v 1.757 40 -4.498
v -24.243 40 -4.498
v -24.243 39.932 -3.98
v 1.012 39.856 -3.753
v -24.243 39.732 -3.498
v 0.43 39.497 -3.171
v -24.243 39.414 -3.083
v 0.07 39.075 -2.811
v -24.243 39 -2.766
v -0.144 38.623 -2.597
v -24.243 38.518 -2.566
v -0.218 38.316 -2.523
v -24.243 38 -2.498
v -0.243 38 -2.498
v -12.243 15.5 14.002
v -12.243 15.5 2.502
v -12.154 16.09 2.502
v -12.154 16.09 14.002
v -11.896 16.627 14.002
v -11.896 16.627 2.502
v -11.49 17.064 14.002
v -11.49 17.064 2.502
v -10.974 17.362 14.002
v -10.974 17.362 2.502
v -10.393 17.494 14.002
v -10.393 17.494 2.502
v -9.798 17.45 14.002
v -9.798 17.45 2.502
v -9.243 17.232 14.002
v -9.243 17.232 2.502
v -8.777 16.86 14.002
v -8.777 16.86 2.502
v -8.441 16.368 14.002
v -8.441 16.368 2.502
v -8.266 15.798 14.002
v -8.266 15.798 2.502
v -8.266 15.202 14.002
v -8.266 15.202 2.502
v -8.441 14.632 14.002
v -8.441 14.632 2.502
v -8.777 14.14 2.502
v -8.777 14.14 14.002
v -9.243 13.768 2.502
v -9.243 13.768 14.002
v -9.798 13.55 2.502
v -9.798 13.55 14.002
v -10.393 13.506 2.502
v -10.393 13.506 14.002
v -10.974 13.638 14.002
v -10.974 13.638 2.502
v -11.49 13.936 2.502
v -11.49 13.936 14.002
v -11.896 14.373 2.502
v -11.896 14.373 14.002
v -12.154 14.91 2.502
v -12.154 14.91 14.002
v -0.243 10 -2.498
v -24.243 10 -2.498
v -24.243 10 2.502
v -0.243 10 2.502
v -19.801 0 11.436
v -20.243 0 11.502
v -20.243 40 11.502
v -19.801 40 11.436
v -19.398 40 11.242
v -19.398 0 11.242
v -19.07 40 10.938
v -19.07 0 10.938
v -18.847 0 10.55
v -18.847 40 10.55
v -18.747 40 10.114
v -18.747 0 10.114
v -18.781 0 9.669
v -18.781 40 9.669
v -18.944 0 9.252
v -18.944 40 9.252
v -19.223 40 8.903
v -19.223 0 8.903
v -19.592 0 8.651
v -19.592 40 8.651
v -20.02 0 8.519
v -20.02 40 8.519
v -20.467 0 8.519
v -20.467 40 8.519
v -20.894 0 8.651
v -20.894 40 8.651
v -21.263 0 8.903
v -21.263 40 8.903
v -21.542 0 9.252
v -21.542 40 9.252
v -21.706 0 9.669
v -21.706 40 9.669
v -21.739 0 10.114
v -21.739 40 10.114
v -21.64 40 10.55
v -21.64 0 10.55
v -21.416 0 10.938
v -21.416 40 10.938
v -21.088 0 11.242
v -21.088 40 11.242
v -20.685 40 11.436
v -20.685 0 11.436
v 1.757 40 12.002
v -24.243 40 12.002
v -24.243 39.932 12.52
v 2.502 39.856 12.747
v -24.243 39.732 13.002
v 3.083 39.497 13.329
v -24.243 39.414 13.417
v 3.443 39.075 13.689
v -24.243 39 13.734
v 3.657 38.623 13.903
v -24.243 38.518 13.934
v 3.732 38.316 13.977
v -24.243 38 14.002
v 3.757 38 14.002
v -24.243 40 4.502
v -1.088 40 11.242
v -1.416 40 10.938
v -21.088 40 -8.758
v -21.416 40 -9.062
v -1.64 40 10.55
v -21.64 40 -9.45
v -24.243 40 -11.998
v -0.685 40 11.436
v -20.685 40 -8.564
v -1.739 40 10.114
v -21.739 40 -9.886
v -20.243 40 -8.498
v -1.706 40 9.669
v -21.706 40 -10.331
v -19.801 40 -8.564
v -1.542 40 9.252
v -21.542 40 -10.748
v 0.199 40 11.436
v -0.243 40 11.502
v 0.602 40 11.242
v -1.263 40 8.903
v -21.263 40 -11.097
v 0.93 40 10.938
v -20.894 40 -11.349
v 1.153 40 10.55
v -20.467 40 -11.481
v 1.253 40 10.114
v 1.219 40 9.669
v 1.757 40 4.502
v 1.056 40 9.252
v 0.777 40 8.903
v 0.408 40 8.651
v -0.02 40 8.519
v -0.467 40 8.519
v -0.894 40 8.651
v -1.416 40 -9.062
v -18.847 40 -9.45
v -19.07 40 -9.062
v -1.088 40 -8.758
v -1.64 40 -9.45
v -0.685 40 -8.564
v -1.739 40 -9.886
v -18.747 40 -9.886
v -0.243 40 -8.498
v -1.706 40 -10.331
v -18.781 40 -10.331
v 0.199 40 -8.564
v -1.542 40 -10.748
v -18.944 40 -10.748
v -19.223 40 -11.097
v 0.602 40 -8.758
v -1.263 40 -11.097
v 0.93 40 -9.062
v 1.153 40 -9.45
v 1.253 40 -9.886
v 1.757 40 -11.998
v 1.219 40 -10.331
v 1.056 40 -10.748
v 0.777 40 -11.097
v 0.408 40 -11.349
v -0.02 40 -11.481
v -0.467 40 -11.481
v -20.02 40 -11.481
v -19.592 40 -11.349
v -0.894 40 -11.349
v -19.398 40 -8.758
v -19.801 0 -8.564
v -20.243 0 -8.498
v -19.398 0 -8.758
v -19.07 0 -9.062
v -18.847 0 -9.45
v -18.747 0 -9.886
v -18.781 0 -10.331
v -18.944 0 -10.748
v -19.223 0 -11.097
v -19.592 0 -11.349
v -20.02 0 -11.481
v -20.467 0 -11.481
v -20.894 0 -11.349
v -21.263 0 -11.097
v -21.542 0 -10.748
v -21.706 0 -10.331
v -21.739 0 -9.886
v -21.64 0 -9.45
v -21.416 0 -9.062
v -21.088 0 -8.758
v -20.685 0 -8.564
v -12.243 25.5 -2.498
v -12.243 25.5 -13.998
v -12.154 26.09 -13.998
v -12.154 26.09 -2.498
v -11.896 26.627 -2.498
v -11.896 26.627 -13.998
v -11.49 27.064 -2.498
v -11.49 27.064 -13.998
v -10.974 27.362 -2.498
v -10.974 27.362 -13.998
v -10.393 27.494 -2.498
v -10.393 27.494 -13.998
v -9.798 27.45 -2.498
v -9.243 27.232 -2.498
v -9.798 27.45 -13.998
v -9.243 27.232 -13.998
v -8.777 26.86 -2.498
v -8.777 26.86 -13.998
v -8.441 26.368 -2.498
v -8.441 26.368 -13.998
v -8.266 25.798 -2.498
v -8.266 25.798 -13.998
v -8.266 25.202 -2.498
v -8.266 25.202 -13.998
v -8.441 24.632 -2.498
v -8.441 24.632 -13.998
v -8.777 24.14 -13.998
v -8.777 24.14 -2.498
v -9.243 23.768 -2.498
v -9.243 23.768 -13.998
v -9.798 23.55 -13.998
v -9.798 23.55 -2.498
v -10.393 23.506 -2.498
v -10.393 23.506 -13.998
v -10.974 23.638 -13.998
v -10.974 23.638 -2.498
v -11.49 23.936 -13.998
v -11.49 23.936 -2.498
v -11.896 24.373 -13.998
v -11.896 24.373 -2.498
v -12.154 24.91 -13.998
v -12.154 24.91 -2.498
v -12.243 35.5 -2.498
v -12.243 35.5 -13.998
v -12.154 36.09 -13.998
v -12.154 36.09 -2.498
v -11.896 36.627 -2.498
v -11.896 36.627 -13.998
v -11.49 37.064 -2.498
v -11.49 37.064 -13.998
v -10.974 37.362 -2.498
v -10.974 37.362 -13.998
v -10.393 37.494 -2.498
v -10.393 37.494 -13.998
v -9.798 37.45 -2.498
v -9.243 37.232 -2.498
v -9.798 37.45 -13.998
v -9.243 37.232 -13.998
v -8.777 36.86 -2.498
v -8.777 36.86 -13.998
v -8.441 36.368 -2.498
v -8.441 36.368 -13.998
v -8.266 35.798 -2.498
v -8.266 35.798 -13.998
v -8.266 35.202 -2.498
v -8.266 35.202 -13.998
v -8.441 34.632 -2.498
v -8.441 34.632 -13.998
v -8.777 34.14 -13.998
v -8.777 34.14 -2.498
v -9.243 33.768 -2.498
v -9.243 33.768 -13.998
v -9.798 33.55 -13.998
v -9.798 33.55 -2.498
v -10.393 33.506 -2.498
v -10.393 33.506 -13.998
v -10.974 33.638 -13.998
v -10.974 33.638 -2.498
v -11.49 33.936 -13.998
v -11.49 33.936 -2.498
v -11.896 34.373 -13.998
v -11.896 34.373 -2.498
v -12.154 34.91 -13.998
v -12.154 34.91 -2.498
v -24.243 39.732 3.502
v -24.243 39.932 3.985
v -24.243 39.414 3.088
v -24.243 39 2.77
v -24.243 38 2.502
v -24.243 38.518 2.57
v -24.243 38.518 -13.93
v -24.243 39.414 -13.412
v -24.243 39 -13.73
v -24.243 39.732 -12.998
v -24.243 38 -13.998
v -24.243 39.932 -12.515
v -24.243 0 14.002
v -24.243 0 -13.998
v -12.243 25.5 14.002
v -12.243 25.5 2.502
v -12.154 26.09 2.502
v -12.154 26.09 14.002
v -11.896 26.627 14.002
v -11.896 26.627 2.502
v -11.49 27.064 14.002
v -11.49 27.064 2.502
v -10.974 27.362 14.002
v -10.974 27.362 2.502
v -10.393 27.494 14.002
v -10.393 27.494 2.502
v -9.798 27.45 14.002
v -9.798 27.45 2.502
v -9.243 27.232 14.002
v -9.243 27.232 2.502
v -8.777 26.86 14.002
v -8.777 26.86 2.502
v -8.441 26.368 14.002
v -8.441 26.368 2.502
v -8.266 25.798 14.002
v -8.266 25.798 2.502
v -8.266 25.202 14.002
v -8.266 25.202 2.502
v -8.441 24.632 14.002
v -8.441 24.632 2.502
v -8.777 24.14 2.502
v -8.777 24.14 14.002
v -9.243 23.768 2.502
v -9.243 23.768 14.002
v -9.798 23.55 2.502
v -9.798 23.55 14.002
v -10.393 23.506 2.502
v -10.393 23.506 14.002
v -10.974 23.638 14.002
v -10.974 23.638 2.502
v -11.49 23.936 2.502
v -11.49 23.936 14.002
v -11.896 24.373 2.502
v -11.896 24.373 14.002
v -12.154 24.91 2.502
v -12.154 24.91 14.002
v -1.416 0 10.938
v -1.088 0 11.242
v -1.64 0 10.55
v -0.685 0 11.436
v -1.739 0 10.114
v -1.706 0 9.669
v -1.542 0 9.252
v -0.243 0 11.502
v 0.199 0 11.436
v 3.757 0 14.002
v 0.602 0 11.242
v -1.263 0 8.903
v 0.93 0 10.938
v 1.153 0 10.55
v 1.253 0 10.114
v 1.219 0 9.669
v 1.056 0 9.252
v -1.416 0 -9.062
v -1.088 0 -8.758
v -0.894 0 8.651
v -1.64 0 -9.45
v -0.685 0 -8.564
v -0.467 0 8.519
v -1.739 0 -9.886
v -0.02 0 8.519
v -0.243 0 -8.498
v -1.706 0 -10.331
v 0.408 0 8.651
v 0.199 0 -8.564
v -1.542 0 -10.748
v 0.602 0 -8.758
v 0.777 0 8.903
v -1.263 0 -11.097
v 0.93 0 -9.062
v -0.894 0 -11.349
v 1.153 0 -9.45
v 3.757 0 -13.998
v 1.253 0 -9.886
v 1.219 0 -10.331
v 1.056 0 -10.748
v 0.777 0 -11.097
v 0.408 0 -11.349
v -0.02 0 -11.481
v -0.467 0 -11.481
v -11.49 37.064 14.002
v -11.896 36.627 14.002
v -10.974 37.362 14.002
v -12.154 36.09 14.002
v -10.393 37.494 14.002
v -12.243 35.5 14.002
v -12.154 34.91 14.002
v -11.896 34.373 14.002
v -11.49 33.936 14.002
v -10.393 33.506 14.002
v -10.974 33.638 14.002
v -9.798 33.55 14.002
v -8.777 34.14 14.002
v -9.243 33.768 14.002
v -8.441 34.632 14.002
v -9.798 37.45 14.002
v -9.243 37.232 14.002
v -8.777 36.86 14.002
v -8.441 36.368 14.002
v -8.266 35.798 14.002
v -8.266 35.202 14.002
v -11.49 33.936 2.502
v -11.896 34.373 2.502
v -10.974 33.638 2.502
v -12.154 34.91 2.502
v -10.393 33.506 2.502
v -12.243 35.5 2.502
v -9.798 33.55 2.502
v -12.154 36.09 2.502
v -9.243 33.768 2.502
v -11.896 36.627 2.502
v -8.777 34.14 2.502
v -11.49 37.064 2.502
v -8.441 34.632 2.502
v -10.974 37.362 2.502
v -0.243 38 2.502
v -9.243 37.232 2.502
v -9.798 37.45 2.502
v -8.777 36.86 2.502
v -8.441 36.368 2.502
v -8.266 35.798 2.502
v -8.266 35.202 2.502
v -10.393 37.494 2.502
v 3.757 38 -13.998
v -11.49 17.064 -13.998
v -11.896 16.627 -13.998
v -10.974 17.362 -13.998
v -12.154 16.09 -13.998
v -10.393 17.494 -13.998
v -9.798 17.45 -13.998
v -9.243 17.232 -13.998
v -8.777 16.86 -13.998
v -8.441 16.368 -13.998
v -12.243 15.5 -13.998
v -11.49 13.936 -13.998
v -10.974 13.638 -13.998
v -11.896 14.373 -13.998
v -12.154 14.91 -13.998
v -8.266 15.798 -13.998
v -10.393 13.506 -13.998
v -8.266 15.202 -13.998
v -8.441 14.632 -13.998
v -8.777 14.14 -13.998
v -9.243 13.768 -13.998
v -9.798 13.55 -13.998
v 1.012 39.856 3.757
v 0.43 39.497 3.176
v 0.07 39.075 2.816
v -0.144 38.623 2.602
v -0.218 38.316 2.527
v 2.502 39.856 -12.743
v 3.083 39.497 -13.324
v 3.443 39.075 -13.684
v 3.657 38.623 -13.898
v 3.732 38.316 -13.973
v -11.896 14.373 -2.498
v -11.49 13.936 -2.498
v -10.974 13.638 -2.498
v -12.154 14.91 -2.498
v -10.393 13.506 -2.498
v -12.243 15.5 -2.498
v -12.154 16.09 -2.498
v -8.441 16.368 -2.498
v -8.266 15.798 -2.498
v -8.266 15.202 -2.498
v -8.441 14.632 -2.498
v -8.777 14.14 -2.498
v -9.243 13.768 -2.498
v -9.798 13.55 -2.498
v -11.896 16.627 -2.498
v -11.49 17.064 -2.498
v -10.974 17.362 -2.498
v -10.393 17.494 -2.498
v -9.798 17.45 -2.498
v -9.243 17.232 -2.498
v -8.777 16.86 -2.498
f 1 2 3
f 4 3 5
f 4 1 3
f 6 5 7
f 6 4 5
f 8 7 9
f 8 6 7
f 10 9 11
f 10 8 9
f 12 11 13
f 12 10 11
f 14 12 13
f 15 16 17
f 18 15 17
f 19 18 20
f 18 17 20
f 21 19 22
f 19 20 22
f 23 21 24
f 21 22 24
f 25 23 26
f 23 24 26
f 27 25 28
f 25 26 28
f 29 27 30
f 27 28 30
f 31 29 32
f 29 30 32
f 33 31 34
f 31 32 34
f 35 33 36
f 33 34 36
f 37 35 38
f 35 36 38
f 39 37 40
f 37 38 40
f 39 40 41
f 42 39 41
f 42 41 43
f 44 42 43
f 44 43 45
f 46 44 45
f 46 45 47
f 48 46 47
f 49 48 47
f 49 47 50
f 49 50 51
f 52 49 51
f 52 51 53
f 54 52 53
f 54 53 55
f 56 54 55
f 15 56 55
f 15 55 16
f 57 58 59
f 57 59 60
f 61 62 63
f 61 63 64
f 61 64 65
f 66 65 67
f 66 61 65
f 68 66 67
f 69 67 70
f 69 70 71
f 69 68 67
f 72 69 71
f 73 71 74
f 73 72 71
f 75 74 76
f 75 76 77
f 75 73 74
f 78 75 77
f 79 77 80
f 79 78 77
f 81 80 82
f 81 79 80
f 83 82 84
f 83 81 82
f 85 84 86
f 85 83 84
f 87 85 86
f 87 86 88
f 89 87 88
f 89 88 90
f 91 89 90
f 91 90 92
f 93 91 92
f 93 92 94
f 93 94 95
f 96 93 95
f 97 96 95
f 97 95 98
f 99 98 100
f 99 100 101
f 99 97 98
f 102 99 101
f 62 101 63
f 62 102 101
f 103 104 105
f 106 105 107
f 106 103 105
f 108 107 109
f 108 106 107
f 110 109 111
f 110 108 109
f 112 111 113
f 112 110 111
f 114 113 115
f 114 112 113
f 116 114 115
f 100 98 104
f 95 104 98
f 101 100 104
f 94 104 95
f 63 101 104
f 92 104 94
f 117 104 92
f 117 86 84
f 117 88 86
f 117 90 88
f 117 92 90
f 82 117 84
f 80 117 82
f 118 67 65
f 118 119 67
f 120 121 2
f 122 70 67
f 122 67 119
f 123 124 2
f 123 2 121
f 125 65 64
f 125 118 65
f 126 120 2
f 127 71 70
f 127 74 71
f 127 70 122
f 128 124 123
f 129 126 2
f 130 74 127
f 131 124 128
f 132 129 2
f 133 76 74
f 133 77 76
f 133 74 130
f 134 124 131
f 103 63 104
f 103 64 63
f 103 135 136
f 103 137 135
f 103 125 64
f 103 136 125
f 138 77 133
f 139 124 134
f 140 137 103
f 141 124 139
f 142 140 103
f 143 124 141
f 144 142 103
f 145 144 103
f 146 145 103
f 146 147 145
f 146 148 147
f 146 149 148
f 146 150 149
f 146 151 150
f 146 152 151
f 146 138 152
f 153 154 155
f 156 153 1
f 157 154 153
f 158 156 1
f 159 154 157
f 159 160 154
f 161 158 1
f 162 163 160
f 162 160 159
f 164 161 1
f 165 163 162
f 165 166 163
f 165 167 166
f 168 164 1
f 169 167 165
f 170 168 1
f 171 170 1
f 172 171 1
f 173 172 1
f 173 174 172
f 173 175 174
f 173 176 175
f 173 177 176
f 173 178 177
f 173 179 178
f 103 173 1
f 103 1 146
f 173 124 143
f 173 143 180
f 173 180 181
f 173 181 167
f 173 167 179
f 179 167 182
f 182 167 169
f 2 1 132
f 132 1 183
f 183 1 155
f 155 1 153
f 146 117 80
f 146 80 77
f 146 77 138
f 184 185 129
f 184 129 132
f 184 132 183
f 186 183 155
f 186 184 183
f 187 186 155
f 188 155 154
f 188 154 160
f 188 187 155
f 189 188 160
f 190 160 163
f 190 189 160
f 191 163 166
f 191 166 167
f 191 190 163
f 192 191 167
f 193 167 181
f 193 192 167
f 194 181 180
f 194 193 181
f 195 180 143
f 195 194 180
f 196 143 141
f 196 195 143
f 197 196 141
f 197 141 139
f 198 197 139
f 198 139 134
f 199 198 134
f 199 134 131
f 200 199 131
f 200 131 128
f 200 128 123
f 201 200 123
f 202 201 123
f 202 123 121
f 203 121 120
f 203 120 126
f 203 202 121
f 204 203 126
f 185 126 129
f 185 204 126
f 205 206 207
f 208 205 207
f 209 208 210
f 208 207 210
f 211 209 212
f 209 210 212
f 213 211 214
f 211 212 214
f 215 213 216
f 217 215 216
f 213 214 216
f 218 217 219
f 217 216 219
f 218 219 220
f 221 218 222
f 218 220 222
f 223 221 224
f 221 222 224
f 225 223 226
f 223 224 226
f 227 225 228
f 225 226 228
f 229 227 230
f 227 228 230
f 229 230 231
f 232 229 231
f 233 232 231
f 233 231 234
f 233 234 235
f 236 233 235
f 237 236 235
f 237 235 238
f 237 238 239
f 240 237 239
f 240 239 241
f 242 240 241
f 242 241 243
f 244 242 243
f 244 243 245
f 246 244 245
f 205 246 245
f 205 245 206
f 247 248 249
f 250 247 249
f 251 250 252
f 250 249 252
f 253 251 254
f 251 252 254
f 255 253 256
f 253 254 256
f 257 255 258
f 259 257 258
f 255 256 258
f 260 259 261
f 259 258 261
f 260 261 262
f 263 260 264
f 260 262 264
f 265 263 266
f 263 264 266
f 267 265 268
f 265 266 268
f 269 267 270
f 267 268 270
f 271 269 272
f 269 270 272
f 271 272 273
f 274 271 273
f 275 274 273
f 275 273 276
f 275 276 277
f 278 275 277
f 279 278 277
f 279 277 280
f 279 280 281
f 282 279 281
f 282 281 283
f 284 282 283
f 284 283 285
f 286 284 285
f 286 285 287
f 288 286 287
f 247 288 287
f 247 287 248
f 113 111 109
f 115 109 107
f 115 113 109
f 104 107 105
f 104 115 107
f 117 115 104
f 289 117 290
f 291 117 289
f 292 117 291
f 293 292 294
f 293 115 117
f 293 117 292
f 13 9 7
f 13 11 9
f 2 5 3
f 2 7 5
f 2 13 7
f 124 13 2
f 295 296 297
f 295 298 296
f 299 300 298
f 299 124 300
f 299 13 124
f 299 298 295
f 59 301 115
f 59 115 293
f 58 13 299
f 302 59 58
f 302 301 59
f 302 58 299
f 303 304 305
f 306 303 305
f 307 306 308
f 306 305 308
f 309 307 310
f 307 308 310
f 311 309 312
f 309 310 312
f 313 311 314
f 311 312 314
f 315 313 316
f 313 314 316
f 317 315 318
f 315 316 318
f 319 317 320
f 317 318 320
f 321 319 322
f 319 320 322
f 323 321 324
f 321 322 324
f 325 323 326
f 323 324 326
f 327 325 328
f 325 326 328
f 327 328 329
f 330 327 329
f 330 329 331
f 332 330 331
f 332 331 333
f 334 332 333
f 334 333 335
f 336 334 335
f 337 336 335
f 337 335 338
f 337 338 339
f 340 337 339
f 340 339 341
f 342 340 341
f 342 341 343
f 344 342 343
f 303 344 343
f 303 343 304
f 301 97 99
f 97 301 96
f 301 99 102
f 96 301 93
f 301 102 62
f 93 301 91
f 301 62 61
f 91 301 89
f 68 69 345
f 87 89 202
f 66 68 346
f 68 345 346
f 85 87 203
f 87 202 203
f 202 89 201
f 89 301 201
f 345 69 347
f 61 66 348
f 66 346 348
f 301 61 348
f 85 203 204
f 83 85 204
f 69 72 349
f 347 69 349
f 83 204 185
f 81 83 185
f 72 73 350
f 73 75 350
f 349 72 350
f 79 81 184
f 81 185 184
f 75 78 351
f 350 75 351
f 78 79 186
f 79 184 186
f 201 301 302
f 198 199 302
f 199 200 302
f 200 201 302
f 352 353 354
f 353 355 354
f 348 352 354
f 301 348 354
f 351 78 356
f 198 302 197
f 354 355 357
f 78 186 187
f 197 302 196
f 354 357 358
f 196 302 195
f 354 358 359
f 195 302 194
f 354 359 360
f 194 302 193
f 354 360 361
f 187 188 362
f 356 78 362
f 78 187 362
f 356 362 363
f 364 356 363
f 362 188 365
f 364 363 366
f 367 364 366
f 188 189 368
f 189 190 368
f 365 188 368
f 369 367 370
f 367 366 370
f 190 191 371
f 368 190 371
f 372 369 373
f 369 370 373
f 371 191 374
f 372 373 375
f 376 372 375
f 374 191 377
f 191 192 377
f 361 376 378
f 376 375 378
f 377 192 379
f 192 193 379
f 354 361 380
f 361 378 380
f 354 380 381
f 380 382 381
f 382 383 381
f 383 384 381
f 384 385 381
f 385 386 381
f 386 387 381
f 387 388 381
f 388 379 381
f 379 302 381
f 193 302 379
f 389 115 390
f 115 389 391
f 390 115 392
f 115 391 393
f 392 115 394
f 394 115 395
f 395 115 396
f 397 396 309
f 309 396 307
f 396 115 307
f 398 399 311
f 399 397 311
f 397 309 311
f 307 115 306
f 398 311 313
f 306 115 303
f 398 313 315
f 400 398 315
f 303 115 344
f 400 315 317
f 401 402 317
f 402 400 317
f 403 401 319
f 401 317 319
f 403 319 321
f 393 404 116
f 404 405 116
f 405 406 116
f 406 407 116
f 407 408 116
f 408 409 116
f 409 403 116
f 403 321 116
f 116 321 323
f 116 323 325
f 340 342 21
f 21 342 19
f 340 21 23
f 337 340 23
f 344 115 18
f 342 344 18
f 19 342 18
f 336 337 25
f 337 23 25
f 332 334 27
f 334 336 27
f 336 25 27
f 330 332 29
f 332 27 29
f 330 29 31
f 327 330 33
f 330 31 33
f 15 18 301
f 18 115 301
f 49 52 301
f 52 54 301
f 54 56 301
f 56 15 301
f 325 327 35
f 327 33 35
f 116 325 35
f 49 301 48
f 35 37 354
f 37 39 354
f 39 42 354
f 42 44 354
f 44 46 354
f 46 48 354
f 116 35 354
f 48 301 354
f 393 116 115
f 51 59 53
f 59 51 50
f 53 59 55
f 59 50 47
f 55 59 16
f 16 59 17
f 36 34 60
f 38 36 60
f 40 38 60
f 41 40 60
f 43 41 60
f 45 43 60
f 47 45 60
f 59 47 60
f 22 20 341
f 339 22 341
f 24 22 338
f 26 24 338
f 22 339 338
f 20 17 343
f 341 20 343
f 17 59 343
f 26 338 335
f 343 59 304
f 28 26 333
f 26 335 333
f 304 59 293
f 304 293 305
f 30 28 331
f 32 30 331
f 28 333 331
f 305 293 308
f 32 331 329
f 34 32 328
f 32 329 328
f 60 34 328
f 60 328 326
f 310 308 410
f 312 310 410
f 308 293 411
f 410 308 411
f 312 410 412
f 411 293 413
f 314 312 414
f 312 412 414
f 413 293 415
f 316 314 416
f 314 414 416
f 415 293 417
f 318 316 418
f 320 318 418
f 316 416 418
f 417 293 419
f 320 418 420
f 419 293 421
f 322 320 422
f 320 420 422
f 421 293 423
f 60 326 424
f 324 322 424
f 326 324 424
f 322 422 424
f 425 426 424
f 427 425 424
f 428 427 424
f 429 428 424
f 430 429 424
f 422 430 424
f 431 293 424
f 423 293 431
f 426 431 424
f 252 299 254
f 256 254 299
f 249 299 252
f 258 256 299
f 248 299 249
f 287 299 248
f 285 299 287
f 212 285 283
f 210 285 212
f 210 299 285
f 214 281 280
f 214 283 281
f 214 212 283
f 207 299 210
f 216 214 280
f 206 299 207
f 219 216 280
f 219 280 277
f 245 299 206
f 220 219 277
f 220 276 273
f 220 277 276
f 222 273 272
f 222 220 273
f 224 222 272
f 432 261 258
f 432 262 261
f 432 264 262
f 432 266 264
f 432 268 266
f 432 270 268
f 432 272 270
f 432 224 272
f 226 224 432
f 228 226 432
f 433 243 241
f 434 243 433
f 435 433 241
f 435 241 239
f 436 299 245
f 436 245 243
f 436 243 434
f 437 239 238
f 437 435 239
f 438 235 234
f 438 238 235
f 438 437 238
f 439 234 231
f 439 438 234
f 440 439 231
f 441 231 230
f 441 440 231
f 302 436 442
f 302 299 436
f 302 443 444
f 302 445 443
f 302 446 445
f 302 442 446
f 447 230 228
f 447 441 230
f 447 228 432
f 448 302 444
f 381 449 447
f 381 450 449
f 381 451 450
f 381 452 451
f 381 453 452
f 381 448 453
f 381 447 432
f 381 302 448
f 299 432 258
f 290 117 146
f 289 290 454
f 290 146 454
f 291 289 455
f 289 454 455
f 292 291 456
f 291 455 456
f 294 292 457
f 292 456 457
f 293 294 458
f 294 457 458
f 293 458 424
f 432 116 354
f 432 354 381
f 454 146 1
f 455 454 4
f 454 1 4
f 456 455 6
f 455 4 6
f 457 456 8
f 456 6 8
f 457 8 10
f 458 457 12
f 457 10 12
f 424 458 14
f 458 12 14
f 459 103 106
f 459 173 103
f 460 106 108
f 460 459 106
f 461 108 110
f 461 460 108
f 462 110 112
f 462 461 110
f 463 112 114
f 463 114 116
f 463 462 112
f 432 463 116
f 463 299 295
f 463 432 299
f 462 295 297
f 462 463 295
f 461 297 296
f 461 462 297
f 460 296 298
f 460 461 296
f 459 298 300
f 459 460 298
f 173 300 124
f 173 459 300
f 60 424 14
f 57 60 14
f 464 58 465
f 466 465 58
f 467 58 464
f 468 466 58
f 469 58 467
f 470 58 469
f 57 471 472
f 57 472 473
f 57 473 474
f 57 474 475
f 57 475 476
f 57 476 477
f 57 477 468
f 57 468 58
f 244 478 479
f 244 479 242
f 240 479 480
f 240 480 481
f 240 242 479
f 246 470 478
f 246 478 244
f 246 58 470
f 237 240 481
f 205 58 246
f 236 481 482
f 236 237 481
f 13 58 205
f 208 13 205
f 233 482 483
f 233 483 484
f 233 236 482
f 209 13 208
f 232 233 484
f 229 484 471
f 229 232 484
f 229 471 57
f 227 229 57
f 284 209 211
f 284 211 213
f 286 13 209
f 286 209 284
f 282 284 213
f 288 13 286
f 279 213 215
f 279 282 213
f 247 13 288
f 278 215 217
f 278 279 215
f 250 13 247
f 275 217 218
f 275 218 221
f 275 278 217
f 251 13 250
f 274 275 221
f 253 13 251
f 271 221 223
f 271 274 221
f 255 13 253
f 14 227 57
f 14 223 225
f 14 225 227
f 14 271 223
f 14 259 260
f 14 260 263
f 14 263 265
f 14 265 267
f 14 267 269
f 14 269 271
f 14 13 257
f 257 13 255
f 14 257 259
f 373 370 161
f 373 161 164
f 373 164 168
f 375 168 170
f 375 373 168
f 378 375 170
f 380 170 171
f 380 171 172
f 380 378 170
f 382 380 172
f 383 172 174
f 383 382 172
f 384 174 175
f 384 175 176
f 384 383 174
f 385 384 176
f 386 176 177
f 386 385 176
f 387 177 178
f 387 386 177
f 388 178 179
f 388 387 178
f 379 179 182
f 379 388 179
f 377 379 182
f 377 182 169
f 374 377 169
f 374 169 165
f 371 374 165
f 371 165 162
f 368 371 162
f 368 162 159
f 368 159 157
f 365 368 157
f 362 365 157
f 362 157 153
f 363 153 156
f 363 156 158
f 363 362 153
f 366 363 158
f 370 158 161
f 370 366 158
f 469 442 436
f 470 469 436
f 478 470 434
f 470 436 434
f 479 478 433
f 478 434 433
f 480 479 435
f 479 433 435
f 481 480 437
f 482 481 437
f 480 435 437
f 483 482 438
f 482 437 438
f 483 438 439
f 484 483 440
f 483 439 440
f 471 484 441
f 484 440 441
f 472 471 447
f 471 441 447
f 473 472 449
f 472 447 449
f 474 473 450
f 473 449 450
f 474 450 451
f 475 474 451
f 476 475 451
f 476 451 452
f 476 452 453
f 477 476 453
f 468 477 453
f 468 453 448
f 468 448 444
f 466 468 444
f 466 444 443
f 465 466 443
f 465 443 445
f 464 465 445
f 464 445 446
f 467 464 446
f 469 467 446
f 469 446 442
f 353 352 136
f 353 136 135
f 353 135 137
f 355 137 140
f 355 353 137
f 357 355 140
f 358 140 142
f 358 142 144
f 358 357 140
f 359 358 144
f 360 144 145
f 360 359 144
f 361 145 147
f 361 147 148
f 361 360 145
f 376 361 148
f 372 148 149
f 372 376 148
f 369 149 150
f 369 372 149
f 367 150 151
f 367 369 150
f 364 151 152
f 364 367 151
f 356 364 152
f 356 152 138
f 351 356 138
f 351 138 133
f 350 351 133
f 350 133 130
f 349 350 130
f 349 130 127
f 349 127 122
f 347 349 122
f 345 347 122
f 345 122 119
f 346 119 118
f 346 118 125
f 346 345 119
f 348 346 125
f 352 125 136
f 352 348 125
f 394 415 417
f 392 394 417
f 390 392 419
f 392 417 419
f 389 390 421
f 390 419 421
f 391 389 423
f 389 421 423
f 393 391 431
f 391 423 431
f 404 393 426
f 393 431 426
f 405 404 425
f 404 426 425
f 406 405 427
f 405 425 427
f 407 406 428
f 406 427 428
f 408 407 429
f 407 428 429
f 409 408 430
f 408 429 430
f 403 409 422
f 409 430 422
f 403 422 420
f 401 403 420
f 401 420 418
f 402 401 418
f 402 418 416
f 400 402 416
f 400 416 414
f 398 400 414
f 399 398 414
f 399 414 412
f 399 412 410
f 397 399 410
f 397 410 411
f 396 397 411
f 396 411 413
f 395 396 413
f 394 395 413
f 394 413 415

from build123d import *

# Parameters (mm, degrees)
SKIZZE2_W                       = 28
SKIZZE2_H                       = 28
SKIZZE2_R                       = 1.5
AUFSATZ_LINEAR_AUSTRAGEN1_DEPTH = 40
SKIZZE3_W                       = 24
SKIZZE3_H                       = 5
SCHNITT_LINEAR_AUSTRAGEN1_DEPTH = 30
F_4_0_4_DURCHMESSER_BOHRUNG1_D  = 4
VERRUNDUNG1_R                   = 2


with BuildPart() as part:
    # Skizze2 → Aufsatz-Linear austragen1 (new body)
    with BuildSketch(Plane(origin=(0, 0, 0), x_dir=(1, 0, 0), z_dir=(0, 1, 0))):
        with Locations((-10.243240712, -0.002346974)):
            Rectangle(SKIZZE2_W, SKIZZE2_H)
        with Locations(Location((-20.243240712, 9.997653026, 0), (0, 0, 270))):
            Circle(SKIZZE2_R, mode=Mode.SUBTRACT)
        with Locations(Location((-0.243240712, 9.997653026, 0), (0, 0, 270))):
            Circle(SKIZZE2_R, mode=Mode.SUBTRACT)
        with Locations(Location((-20.243240712, -10.002346974, 0), (0, 0, 270))):
            Circle(SKIZZE2_R, mode=Mode.SUBTRACT)
        with Locations(Location((-0.243240712, -10.002346974, 0), (0, 0, 270))):
            Circle(SKIZZE2_R, mode=Mode.SUBTRACT)
    extrude(amount=AUFSATZ_LINEAR_AUSTRAGEN1_DEPTH)

    # Skizze3 → Schnitt-Linear austragen1 (cut)
    with BuildSketch(Plane(origin=(0, 40, 0), x_dir=(1, 0, 0), z_dir=(0, 1, 0))):
        with Locations((-12.243240712, -0.002346974)):
            Rectangle(SKIZZE3_W, SKIZZE3_H)
    extrude(amount=-SCHNITT_LINEAR_AUSTRAGEN1_DEPTH, mode=Mode.SUBTRACT)

    # Ø4.0 (4) Durchmesser Bohrung1 (through all)
    with Locations(Plane.XY.offset(14.002346974)):
        with Locations((-10.243240712, 15.5), (-10.243240712, 35.5), (-10.243240712, 25.5)):
            Hole(F_4_0_4_DURCHMESSER_BOHRUNG1_D / 2)

    # Verrundung1
    verrundung1_edges = [part.edges().sort_by_distance(p)[0] for p in [
        (3.756759288, 40, 0.002346974),
        (-10.243240712, 40, -13.997653026),
        (-12.243240712, 40, 2.502346974),
        (-0.243240712, 40, 0.002346974),
        (-12.243240712, 40, -2.497653026),
        (-10.243240712, 40, 14.002346974),
    ]]
    fillet(verrundung1_edges, radius=VERRUNDUNG1_R - 0.0001)  # a hair under: the kernel refuses the full size


solid = part.part
